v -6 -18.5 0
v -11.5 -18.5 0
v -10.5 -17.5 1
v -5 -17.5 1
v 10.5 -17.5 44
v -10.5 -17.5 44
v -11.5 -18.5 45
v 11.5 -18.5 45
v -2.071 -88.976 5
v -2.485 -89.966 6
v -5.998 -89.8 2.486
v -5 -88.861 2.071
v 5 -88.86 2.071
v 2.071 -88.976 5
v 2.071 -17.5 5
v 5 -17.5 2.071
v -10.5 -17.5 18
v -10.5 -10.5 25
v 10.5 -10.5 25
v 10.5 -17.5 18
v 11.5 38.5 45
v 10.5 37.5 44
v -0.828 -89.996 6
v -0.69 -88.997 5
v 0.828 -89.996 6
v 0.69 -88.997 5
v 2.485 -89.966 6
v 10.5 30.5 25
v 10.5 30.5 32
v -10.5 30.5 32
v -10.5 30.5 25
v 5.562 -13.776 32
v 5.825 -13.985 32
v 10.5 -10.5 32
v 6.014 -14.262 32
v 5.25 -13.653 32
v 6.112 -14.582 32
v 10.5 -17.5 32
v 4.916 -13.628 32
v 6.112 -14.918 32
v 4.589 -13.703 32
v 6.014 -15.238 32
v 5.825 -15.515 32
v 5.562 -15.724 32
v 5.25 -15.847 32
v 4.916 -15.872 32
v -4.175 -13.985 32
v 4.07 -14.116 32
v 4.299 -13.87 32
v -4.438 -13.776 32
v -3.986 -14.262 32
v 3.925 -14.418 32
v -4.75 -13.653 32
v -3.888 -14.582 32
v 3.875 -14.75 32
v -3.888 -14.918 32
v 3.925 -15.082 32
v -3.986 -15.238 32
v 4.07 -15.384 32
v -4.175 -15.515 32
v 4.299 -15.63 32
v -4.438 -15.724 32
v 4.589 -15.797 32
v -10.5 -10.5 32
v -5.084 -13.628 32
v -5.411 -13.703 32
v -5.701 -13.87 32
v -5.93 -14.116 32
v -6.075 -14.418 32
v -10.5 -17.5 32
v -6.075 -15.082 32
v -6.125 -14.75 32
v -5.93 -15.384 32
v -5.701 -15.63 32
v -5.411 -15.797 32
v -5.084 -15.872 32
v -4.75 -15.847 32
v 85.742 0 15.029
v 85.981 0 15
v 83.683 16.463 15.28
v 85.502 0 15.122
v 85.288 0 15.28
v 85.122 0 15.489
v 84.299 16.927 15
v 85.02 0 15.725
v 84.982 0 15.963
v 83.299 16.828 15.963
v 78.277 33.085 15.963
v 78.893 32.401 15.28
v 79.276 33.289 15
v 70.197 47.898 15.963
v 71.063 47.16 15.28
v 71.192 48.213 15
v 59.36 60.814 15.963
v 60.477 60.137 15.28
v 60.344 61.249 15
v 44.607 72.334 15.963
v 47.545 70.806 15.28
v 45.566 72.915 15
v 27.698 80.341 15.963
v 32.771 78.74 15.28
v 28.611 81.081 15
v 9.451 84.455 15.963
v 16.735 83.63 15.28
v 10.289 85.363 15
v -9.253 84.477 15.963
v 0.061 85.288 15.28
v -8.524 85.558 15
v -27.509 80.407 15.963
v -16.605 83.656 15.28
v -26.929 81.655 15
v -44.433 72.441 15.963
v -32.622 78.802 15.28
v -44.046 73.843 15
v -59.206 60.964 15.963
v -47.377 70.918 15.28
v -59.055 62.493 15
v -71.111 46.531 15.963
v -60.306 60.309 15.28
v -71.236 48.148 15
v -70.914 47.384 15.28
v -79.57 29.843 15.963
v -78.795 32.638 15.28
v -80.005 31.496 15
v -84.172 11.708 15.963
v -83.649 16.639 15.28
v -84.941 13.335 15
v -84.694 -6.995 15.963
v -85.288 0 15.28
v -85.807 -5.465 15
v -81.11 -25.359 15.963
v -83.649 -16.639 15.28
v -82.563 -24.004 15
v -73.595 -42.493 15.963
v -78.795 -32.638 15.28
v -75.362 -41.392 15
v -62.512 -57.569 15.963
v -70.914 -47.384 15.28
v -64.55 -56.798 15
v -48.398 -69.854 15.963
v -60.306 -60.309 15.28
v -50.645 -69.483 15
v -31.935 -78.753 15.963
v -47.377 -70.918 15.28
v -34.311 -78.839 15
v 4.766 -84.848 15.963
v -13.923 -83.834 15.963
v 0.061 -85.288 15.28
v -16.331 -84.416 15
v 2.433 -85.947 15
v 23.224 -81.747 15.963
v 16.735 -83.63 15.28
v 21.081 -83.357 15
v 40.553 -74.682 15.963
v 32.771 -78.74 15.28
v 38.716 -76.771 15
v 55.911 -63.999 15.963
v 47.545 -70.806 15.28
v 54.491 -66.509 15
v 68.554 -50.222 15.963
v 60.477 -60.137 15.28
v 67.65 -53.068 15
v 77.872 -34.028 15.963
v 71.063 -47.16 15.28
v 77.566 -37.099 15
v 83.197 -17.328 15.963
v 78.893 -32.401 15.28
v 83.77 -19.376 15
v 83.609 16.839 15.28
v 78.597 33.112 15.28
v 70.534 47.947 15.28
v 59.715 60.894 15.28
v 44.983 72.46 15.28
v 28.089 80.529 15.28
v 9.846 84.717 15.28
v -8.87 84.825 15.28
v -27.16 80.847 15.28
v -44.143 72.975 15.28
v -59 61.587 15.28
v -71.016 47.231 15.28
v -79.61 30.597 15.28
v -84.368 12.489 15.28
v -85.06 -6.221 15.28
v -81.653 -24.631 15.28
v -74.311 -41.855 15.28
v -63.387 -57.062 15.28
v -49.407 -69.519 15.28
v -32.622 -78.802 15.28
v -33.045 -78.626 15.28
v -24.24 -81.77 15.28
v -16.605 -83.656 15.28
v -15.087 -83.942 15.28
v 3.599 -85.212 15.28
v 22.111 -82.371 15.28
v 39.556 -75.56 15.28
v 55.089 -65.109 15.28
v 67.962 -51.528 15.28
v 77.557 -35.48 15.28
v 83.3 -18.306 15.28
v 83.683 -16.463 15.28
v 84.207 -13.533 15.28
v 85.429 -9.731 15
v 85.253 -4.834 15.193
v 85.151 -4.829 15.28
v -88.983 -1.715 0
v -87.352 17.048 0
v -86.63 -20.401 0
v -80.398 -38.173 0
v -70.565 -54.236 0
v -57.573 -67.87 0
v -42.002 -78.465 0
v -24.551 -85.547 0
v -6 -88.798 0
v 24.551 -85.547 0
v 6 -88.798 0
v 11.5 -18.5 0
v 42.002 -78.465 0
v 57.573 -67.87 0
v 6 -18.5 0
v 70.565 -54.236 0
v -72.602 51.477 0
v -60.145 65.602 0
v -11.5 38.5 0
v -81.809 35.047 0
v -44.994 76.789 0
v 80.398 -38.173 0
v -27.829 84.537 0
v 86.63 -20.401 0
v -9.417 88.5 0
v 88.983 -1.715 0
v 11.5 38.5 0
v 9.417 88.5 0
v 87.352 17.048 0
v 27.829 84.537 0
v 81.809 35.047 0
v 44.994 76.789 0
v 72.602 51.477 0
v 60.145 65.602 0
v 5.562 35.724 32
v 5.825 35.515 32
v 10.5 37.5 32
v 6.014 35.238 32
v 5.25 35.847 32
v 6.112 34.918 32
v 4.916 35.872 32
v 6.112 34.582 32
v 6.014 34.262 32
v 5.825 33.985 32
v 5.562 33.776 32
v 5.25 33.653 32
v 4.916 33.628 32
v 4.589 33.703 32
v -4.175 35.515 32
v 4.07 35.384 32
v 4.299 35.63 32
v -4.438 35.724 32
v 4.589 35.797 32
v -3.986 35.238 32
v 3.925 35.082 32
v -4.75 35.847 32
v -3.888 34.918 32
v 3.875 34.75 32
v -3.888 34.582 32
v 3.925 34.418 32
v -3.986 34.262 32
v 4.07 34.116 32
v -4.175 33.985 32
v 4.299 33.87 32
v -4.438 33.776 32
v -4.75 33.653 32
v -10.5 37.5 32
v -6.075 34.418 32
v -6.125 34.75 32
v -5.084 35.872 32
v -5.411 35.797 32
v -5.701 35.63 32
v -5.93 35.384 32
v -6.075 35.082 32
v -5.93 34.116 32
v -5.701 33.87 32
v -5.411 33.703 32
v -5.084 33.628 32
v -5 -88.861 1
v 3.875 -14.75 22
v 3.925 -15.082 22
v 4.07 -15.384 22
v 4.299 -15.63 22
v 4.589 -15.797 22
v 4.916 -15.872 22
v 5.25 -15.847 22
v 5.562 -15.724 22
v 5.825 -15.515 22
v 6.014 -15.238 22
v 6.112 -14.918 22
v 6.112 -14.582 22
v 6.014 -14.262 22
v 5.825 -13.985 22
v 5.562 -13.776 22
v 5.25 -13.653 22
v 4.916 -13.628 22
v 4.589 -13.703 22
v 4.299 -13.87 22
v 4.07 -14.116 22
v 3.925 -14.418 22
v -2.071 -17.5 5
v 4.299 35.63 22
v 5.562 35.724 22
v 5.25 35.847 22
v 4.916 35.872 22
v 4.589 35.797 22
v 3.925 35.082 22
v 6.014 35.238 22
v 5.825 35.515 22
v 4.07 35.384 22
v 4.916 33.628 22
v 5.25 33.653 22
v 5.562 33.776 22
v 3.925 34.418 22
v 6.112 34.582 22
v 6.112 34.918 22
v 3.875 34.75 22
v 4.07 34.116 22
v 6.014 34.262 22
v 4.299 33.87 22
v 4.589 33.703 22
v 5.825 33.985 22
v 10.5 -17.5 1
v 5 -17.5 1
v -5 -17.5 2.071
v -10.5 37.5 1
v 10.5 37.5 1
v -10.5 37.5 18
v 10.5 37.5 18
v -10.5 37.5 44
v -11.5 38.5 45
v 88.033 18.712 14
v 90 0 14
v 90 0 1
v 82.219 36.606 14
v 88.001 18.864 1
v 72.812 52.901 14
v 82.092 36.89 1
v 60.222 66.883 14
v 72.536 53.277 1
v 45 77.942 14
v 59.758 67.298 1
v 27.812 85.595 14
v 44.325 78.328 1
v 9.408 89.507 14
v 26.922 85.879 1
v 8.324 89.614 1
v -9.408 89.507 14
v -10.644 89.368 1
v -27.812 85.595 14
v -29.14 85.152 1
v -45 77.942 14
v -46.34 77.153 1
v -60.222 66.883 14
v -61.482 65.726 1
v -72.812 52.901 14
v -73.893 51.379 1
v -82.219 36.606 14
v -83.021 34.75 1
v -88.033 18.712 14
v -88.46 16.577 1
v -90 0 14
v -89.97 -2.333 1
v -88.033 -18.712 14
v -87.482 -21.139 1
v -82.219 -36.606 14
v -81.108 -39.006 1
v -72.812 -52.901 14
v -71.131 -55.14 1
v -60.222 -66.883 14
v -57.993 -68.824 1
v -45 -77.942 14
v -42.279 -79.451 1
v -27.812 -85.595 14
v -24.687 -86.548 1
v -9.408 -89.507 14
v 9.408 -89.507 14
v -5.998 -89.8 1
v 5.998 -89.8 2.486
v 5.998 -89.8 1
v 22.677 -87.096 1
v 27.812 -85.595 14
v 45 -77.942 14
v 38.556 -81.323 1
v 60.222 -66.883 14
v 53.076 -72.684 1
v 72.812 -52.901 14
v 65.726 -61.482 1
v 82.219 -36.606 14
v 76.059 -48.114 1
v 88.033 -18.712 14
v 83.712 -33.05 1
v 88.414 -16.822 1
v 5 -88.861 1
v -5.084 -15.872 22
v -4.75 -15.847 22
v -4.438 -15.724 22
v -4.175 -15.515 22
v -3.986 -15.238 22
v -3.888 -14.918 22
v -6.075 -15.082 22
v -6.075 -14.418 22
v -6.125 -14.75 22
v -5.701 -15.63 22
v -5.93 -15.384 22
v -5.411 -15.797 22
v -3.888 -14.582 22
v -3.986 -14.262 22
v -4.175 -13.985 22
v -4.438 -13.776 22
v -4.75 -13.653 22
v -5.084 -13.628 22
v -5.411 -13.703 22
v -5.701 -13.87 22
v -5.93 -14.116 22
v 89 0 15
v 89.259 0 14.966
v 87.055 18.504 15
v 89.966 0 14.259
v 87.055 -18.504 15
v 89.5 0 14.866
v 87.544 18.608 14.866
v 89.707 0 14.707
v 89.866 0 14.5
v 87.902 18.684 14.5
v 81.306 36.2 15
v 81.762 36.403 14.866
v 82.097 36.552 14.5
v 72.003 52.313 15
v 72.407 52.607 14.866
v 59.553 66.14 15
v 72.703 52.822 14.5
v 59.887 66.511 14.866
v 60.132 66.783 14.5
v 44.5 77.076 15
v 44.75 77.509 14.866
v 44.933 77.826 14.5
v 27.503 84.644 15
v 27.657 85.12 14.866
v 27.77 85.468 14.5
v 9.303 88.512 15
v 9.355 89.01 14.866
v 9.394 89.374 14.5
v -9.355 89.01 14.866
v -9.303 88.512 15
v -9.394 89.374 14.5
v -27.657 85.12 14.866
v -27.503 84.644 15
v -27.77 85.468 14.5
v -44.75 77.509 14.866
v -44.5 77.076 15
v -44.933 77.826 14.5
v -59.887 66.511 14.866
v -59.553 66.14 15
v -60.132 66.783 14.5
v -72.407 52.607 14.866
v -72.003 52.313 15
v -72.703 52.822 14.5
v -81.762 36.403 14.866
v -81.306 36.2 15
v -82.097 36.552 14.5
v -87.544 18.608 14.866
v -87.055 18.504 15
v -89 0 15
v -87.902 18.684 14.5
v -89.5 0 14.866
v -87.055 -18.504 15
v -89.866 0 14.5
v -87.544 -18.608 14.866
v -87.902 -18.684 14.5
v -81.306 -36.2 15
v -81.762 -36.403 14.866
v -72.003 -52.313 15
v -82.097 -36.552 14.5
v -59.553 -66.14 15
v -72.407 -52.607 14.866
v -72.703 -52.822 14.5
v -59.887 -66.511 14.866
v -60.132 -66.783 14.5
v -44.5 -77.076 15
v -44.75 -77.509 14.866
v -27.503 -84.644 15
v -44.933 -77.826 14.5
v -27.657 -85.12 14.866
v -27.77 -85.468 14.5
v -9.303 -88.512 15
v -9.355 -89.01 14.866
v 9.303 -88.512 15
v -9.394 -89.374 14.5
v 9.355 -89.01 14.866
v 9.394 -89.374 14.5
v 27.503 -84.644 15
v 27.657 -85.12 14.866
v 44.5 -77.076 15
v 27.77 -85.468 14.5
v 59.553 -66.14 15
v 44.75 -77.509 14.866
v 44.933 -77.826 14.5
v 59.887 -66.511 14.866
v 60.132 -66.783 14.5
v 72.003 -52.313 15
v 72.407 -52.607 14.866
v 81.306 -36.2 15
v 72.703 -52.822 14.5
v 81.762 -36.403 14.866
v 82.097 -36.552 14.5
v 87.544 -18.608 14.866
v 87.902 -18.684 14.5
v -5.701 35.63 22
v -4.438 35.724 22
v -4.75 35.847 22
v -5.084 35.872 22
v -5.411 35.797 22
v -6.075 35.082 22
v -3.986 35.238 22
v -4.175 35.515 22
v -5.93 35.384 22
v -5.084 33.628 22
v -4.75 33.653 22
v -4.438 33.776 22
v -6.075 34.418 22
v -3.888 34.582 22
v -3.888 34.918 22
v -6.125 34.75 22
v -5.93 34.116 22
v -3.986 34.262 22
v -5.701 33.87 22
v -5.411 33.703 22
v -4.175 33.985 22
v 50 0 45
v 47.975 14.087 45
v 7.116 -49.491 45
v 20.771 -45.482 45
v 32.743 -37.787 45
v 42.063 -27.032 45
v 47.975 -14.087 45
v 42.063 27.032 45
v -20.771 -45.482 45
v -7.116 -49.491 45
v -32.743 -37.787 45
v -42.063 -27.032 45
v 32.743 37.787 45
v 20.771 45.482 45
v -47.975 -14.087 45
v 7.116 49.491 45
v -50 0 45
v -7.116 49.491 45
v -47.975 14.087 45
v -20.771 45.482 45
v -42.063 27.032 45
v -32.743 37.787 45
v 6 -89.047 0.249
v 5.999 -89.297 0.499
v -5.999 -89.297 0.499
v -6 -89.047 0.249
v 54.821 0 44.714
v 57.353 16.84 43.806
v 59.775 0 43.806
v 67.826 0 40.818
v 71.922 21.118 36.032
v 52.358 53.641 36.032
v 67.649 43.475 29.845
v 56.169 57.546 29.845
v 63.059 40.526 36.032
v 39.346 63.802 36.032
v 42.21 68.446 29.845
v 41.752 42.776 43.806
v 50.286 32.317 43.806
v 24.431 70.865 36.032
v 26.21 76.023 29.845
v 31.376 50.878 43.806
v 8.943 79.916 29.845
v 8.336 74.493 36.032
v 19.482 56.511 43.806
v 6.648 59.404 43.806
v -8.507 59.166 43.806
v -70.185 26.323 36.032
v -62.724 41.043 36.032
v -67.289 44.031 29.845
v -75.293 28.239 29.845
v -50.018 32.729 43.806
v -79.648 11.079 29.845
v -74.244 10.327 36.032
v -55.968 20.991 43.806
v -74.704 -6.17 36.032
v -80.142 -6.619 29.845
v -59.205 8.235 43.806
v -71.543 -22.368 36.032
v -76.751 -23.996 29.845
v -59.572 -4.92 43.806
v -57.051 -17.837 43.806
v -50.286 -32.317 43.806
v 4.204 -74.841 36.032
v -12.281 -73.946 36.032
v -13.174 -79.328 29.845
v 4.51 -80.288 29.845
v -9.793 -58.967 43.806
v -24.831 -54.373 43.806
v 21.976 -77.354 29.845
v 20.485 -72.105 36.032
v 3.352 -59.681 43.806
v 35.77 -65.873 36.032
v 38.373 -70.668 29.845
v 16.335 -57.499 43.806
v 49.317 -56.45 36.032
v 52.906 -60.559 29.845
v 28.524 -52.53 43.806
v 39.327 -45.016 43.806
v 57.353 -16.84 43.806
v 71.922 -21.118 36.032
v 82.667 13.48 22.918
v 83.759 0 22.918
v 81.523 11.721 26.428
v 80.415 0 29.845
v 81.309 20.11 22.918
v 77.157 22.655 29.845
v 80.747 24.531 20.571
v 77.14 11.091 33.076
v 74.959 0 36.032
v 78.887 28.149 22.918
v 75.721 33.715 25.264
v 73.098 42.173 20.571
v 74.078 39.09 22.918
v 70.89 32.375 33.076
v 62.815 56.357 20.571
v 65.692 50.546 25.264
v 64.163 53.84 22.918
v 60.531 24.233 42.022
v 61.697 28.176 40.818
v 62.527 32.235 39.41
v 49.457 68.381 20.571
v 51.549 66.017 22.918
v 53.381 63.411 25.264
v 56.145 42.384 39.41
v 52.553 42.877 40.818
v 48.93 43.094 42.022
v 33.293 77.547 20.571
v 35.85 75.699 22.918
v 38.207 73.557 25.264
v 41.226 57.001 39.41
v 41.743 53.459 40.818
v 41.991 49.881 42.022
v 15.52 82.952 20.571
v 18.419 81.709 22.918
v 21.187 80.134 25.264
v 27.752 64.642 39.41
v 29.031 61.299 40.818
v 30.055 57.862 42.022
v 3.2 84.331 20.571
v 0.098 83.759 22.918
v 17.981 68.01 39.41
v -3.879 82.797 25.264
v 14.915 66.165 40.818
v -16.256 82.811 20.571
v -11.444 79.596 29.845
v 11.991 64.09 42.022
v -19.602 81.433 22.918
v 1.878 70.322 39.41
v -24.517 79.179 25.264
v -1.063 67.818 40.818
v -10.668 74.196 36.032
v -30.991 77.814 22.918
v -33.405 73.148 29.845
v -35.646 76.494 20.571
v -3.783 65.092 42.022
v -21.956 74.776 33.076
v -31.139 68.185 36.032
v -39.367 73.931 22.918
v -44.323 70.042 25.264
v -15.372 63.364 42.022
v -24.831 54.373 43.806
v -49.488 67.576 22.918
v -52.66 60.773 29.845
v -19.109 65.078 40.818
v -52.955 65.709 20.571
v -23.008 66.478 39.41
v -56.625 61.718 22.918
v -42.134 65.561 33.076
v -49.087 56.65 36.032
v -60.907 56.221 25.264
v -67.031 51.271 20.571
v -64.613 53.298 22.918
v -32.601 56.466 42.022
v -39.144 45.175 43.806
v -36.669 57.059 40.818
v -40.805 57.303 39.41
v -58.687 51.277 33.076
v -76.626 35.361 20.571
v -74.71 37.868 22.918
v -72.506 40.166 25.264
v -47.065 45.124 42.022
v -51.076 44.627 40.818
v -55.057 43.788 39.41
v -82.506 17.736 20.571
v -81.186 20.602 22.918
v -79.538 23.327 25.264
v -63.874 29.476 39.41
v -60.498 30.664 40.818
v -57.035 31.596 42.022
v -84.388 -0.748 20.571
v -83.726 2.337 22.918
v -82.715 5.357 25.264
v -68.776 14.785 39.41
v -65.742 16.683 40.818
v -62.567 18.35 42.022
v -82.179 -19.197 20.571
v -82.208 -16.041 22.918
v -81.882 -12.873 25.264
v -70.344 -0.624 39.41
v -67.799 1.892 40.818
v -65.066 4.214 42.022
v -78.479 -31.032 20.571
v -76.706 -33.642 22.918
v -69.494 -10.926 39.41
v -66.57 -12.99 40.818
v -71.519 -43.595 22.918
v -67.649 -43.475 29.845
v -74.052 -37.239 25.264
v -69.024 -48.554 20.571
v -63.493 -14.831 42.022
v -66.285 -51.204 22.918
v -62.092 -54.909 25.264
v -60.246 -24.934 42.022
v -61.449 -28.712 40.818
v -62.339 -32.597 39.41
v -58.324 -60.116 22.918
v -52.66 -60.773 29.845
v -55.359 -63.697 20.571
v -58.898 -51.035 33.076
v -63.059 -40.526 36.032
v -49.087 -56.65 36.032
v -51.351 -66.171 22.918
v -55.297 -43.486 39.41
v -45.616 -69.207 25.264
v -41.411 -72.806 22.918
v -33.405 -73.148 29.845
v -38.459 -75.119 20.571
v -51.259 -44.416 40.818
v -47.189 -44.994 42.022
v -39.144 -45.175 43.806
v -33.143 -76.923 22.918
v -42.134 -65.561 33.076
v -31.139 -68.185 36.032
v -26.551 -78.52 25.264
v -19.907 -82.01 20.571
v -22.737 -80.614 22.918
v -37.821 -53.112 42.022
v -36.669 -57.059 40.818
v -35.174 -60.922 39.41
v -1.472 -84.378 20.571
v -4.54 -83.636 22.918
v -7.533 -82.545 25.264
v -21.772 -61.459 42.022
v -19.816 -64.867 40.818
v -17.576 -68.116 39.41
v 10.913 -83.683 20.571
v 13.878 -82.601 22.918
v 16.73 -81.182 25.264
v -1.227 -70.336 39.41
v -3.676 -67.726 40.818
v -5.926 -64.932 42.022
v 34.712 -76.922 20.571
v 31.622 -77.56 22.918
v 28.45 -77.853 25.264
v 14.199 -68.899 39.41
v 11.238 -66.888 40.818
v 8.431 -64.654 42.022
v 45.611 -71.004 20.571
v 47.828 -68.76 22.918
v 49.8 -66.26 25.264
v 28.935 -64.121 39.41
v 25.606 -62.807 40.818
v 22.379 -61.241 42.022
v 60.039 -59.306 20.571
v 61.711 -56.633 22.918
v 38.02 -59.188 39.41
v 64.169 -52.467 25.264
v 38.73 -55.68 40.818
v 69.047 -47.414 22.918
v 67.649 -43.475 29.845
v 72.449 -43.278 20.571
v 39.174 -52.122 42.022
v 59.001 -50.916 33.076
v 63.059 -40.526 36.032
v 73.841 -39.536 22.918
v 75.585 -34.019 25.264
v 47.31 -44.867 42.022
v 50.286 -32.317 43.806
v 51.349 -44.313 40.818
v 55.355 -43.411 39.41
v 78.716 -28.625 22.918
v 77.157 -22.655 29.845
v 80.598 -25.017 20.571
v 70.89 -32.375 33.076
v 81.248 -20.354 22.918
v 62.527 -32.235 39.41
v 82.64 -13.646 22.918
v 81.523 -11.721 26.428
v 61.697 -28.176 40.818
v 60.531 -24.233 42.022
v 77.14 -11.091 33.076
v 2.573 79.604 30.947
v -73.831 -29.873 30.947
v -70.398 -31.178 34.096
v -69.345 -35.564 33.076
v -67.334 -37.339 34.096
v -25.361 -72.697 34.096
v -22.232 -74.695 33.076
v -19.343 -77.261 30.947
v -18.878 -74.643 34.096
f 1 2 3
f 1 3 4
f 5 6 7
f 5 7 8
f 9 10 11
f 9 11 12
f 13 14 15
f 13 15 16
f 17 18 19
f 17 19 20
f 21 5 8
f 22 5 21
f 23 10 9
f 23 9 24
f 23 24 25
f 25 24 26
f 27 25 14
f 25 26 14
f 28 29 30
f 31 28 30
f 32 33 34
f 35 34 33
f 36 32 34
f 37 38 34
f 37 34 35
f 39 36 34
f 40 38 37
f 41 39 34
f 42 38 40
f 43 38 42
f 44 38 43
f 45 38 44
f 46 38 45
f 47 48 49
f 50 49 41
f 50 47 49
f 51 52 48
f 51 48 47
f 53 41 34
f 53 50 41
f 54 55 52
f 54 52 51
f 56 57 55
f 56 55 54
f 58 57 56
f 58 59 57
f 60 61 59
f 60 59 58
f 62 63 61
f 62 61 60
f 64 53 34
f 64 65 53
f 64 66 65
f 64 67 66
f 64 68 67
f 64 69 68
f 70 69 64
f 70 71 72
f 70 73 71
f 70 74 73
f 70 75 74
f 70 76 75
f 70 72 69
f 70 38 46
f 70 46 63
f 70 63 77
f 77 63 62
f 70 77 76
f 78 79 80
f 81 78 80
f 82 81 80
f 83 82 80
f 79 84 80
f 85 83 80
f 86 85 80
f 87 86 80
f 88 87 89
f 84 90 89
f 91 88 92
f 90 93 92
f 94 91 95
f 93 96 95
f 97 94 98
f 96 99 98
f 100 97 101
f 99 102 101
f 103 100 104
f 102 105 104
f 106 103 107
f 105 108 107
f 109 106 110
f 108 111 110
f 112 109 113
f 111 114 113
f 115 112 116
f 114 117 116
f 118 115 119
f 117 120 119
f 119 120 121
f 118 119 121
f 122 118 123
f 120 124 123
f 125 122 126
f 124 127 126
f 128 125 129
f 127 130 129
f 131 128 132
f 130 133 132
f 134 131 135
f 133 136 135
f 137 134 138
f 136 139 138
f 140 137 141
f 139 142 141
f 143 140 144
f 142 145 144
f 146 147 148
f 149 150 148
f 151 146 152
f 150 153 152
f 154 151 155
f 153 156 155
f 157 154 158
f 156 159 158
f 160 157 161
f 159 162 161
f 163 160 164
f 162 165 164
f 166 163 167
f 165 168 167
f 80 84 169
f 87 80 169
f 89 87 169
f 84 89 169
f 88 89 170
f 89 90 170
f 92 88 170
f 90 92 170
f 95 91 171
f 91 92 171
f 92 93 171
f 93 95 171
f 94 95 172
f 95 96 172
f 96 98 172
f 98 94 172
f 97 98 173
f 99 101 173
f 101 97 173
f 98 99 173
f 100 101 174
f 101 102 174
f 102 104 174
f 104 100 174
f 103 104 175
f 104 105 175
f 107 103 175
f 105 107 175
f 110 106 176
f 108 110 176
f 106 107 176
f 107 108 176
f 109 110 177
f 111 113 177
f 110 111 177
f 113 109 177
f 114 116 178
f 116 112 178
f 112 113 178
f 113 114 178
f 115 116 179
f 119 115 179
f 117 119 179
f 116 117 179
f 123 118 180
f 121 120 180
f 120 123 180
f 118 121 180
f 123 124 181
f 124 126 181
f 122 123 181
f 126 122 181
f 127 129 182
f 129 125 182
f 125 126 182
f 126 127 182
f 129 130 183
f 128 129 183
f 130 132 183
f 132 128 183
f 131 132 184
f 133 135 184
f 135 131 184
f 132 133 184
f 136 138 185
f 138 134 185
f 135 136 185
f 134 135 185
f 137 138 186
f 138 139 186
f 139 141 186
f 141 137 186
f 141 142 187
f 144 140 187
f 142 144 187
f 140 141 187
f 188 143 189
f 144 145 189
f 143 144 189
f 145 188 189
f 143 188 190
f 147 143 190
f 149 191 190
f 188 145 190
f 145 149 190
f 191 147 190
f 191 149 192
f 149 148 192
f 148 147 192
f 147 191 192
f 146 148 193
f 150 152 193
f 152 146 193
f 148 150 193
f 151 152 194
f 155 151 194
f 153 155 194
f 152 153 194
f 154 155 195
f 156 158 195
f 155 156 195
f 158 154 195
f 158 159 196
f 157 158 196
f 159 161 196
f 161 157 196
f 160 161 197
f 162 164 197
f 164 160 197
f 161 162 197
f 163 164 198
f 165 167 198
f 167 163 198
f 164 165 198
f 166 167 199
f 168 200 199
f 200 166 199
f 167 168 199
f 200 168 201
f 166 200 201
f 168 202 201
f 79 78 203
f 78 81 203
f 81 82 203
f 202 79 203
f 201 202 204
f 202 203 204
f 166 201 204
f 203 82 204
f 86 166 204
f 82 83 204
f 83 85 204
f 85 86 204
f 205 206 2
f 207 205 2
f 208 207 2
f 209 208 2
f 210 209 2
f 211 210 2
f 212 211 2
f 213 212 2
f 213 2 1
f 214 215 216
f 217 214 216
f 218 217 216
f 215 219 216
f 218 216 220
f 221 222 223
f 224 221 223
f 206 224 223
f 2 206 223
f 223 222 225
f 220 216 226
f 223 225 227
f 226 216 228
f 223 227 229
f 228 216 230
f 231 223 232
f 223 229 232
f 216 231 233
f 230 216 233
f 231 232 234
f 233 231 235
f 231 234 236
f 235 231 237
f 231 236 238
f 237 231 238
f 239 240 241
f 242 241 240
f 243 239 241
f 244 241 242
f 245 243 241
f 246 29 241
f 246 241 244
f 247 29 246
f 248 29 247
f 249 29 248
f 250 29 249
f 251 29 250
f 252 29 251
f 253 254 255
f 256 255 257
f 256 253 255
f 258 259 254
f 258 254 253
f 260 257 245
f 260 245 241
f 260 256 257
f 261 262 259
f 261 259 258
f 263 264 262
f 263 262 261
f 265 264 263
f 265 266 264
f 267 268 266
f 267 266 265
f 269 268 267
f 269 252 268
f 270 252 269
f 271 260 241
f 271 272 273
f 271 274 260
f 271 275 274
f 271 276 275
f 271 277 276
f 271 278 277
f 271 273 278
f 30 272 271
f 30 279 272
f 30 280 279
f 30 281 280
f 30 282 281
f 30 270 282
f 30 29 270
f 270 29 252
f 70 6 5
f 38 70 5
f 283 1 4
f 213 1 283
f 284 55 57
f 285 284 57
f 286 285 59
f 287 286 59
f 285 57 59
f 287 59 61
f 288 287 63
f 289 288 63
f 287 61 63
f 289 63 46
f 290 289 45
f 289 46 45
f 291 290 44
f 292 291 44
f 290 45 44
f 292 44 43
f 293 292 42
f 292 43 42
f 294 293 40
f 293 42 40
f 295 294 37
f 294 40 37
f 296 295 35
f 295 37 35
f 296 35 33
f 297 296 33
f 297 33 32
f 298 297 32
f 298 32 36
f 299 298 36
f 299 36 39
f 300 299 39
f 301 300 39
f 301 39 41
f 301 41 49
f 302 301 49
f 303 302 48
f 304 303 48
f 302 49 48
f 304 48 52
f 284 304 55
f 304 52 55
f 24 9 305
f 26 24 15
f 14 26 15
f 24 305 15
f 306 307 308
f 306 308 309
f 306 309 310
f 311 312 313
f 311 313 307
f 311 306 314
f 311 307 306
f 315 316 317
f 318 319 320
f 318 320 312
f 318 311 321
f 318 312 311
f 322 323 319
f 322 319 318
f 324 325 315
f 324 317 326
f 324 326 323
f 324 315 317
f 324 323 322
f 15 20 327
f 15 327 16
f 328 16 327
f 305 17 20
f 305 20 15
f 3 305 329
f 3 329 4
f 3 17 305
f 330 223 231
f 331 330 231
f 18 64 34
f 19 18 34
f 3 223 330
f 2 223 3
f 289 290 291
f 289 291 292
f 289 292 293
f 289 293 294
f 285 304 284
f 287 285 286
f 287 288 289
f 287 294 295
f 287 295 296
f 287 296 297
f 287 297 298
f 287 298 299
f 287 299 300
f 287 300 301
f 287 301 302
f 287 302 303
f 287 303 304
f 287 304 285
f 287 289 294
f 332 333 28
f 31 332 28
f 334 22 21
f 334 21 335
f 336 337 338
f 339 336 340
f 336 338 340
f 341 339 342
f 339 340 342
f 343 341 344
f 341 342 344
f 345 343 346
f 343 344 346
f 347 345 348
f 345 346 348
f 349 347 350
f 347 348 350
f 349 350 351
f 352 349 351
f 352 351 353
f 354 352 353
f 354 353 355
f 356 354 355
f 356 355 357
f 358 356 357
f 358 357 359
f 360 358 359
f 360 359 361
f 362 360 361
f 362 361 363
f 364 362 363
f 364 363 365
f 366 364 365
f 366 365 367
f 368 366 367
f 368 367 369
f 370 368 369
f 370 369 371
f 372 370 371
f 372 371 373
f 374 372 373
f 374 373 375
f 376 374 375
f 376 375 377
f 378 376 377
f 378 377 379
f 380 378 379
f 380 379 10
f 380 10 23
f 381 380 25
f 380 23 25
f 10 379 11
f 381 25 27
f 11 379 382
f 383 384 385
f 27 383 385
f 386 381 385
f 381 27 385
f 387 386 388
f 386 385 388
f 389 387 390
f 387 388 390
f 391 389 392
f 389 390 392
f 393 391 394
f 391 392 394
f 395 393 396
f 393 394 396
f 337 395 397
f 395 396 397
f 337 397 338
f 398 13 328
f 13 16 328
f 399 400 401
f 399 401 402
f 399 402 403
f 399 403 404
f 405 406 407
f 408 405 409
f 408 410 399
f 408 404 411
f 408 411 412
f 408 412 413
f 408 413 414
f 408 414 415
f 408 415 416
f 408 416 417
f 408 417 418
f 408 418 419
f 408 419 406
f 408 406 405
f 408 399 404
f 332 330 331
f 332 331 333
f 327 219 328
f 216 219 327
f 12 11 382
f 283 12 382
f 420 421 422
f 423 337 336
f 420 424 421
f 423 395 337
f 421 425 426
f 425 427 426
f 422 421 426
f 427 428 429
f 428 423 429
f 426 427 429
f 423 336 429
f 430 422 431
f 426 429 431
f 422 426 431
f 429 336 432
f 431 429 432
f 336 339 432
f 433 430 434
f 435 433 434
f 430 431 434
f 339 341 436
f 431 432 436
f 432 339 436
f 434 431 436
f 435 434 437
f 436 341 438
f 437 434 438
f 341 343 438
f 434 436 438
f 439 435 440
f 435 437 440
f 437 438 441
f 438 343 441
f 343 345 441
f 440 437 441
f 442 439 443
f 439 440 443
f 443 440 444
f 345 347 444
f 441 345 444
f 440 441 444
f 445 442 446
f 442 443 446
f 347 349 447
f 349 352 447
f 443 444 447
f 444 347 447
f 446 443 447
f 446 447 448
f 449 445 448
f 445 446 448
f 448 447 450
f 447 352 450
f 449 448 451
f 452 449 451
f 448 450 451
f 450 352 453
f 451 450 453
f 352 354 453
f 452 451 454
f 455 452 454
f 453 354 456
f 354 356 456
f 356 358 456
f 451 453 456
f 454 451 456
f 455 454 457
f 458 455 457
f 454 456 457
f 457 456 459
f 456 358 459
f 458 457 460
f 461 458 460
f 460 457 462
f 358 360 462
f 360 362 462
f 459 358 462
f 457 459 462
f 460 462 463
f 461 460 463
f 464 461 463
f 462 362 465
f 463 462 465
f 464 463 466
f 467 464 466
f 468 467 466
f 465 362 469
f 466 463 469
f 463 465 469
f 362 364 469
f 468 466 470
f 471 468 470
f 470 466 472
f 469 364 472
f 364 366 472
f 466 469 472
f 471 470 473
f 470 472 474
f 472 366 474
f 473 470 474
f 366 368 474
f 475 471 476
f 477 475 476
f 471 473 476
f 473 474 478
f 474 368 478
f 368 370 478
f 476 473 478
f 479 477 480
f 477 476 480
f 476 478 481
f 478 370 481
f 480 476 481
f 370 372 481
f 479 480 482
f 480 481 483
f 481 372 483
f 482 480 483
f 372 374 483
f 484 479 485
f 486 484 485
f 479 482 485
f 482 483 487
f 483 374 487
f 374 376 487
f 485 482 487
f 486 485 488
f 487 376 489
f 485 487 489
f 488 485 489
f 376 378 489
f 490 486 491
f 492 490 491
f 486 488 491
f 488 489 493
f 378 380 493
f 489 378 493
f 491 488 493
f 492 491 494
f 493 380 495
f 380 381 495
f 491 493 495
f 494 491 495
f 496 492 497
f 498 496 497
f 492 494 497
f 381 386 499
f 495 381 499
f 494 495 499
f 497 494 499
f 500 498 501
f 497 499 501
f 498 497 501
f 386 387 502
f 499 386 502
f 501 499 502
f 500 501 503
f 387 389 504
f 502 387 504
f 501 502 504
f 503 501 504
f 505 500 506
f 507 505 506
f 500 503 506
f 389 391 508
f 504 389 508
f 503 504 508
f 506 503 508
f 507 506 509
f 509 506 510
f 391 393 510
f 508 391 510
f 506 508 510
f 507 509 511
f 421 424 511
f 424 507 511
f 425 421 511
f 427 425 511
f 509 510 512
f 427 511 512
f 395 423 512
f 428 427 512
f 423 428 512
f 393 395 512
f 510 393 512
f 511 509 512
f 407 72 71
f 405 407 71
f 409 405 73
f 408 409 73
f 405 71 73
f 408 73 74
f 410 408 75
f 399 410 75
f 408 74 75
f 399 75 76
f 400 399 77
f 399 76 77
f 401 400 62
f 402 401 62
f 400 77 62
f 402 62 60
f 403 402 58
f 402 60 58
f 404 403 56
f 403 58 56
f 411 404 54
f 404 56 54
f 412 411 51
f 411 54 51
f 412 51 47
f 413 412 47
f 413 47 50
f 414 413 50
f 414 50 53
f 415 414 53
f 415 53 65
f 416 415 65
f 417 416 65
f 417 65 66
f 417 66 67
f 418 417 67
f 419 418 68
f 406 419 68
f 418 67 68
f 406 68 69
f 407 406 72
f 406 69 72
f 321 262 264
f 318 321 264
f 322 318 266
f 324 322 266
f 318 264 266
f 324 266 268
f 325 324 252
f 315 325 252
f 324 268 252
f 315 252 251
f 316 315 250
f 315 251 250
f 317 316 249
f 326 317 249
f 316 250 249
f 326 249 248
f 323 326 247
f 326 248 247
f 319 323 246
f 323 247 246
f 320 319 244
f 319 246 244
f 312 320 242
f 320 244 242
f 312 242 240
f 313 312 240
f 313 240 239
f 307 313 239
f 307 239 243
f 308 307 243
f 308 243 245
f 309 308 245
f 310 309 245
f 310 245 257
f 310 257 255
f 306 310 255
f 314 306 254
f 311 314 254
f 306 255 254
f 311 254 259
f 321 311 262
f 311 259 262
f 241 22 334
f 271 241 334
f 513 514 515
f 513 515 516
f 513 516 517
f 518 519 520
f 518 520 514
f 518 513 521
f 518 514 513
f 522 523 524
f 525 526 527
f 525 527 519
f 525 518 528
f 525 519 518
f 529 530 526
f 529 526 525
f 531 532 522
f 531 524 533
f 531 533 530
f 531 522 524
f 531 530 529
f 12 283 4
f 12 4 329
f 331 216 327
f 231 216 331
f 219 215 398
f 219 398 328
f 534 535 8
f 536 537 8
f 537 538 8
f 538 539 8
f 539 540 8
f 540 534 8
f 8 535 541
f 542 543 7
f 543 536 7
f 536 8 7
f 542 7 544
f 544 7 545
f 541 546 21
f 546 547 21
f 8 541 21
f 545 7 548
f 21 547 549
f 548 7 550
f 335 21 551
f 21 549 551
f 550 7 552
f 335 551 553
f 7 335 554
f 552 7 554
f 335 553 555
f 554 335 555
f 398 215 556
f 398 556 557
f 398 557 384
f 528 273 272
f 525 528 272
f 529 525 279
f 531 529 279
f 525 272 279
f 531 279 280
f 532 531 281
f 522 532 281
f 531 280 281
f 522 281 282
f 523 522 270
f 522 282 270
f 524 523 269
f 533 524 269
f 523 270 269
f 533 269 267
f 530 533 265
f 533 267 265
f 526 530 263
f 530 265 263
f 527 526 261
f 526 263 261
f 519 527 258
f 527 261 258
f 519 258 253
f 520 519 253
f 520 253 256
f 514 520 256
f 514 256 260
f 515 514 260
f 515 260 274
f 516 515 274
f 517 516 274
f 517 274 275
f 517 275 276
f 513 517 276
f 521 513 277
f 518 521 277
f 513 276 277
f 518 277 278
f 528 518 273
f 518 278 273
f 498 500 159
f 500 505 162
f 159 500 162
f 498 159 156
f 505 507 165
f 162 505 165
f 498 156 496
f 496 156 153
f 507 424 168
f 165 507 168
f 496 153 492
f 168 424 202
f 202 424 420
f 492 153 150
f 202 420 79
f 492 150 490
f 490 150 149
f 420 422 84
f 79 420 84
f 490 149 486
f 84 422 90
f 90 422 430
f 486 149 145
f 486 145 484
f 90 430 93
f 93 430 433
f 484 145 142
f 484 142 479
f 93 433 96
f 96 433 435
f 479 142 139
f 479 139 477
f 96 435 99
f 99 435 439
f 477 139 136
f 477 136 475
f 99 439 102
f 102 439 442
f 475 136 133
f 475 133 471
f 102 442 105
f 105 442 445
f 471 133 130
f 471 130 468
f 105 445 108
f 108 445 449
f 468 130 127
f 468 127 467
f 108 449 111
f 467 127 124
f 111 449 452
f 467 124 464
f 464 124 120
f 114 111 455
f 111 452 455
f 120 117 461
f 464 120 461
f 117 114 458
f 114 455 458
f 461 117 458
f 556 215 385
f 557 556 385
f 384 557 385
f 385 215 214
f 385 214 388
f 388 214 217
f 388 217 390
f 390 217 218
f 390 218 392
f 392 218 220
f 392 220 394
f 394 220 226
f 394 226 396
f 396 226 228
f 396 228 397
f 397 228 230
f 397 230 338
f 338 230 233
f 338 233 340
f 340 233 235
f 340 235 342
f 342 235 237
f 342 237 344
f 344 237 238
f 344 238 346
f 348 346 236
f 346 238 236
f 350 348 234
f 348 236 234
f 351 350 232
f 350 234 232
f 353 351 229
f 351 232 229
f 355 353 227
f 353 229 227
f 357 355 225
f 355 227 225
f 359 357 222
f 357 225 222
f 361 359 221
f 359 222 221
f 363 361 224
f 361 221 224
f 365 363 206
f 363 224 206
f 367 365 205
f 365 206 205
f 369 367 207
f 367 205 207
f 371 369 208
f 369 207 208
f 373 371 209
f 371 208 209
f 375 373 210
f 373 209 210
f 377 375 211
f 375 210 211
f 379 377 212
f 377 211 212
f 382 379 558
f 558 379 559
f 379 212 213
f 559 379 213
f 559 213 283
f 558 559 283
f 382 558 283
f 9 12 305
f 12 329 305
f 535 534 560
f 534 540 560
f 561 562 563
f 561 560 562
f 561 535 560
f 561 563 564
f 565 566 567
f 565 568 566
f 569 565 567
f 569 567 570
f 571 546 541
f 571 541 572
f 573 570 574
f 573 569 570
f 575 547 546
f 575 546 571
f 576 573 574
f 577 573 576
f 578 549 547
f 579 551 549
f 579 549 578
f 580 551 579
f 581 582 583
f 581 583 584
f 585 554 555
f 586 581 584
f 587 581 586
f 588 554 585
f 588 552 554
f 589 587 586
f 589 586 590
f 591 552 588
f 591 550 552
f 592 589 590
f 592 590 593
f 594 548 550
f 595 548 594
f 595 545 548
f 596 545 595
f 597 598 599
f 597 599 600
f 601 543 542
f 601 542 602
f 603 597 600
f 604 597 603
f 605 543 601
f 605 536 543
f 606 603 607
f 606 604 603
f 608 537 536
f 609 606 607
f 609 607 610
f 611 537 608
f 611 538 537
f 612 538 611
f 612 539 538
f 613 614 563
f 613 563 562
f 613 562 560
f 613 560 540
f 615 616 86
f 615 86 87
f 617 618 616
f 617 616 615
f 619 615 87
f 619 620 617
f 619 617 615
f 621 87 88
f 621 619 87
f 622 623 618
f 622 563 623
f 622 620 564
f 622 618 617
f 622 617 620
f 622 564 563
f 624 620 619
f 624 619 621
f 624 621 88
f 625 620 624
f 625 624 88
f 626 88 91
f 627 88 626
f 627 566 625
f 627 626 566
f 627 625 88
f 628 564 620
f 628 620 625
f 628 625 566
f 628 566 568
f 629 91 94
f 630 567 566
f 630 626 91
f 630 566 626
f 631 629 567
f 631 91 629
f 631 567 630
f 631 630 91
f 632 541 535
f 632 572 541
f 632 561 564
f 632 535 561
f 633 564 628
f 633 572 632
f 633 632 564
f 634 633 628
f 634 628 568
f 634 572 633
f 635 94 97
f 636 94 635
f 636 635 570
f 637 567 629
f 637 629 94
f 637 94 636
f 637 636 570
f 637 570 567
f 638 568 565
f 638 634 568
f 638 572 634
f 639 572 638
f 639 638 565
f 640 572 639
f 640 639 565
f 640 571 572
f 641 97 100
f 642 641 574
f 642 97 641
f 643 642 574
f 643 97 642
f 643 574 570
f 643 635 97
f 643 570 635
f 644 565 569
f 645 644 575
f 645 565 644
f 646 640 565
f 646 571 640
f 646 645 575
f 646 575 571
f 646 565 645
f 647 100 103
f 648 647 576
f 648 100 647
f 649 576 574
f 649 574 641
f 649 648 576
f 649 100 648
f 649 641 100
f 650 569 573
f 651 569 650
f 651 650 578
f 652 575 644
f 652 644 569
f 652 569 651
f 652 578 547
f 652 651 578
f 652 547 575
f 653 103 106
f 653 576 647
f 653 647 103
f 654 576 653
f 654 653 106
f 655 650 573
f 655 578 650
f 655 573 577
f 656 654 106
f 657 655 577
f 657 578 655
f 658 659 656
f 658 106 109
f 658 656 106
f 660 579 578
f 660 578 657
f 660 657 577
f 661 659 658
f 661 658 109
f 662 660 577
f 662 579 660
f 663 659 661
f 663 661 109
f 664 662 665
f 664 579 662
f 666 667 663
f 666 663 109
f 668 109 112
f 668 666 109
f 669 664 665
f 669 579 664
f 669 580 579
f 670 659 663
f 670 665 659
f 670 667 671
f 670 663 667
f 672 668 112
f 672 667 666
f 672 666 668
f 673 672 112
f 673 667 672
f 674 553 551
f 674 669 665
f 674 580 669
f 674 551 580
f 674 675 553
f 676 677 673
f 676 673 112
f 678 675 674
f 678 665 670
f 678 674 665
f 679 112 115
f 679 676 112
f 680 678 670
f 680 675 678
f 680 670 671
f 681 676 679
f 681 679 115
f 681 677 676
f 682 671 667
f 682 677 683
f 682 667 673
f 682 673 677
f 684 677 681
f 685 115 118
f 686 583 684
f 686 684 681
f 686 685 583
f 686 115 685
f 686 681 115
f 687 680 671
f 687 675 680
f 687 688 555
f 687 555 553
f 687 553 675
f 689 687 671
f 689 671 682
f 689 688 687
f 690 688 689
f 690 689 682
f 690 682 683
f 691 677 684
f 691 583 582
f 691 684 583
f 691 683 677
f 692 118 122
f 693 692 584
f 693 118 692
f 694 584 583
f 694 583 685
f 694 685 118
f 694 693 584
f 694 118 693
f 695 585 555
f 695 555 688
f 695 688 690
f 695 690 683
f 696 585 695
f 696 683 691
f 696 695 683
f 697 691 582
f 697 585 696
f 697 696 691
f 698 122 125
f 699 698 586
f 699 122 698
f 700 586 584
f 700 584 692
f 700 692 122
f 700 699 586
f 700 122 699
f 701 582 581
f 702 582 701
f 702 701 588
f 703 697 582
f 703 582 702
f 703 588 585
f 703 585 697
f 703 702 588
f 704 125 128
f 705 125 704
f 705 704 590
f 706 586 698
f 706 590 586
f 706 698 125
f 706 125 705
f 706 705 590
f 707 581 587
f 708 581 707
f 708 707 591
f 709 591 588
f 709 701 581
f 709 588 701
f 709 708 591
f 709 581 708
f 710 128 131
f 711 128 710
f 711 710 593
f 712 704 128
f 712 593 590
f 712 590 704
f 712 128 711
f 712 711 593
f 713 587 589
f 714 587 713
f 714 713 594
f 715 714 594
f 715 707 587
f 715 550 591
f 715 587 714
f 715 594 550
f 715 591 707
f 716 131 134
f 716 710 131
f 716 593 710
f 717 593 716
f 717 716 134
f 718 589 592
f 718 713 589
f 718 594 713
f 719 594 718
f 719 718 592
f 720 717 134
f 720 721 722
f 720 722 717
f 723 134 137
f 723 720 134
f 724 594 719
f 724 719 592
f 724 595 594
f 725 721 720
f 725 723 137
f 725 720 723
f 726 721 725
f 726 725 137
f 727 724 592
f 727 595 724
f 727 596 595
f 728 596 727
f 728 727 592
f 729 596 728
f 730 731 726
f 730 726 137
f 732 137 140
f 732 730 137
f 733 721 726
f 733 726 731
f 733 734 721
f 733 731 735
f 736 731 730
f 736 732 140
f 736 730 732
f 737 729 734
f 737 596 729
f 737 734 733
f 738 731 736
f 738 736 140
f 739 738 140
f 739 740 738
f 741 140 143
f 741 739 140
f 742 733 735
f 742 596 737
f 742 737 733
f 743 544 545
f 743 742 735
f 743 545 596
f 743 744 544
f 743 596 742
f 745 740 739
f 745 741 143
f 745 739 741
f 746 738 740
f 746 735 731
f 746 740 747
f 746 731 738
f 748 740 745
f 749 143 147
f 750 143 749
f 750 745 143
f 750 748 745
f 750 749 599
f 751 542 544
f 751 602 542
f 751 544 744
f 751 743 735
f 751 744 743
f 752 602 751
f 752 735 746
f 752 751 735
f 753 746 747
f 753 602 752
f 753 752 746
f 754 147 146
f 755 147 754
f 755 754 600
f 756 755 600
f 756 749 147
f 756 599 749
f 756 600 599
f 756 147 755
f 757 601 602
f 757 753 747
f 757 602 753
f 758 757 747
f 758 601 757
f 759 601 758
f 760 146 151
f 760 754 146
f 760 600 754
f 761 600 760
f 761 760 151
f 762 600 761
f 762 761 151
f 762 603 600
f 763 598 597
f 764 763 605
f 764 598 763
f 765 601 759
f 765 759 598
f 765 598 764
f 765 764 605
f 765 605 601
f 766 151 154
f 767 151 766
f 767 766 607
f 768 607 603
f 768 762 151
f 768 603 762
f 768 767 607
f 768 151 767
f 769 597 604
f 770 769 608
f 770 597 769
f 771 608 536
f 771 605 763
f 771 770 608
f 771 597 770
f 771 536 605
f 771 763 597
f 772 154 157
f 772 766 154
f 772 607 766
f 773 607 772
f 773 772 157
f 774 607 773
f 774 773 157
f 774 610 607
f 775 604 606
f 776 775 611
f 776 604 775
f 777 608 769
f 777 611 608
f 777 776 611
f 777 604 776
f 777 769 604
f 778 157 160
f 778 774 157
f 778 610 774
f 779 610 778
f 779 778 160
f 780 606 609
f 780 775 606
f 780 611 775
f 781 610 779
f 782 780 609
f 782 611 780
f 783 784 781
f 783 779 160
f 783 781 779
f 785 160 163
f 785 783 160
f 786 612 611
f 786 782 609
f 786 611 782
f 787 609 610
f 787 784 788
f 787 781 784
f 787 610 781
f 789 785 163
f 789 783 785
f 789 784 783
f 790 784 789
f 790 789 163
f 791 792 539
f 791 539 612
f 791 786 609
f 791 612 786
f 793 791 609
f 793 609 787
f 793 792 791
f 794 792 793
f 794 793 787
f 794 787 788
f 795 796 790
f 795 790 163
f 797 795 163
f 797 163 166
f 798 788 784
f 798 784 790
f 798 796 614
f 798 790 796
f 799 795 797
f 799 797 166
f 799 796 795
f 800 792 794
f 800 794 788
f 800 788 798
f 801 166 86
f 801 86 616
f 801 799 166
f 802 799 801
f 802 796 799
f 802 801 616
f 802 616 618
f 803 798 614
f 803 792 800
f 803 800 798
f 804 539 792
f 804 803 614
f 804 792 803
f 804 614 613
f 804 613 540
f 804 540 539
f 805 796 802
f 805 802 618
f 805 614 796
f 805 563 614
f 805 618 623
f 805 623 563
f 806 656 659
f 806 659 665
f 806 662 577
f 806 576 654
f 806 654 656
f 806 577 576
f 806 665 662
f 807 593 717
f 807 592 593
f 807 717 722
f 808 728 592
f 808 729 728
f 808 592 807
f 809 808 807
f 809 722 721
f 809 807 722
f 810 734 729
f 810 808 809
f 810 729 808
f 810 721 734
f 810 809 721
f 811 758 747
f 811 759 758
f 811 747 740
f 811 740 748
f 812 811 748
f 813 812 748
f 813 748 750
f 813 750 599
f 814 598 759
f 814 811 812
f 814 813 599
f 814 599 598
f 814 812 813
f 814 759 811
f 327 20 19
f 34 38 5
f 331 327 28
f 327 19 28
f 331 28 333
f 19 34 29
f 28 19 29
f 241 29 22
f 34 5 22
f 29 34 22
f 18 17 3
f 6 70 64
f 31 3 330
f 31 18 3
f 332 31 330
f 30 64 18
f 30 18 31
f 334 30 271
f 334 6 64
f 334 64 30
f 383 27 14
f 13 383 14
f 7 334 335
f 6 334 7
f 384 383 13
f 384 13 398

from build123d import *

# Parameters (mm, degrees)
FILLET_R        = 1
POCKET_DEPTH    = 13
POCKET012_DEPTH = 32
SKETCH026_R     = 1.125
POCKET013_DEPTH = 10
POCKET014_DEPTH = 10.5
CHAMFER004_SIZE = 1
POCKET015_DEPTH = 72.5
CHAMFER_SIZE    = 1


with BuildPart() as part:
    # Sketch → Revolution (revolve)
    with BuildSketch(Plane.XZ):
        with BuildLine():
            Line((85, 15), (90, 15))
            Line((90, 15), (90, 0))
            Line((90, 0), (0, 0))
            Line((0, 0), (0, 45))
            Line((0, 45), (50, 45))
            add(Edge.make_bspline(
                [(85, 15), (85, 45), (50, 45)],
                knots=[0, 0, 0, 1.570796, 1.570796, 1.570796], degree=2, weights=[1, 0.707107, 1]))
        make_face()
    revolve(axis=Axis((0, 0, 0), (0, 0, 1)))

    # Fillet
    fillet_edges = [part.edges().sort_by_distance(p)[0] for p in [
        (-90, 0, 15),
        (-85, 0, 15),
    ]]
    fillet(fillet_edges, radius=FILLET_R)

    # Sketch020 → Pocket (cut)
    with BuildSketch(Plane(origin=(0, 0, 45), x_dir=(-1, 0, 0), z_dir=(0, 0, 1))):
        Polygon((-10.5, -37.5), (10.5, -37.5), (10.5, 17.5), (0, 17.5), (-10.5, 17.5), align=None)
    extrude(amount=-POCKET_DEPTH, mode=Mode.SUBTRACT)

    # Sketch025 (on Face13 of Pocket) → Pocket012 (cut)
    with BuildSketch(Plane(origin=(0, 0, 32), x_dir=(-1, 0, 0), z_dir=(0, 0, 1))):
        Polygon((-10.5, -30.5), (10.5, -30.5), (10.5, 10.5), (0, 10.5), (-10.5, 10.5), align=None)
    extrude(amount=-POCKET012_DEPTH, mode=Mode.SUBTRACT)

    # Sketch026 (on Face19 of Pocket012) → Pocket013 (cut)
    with BuildSketch(Plane(origin=(0, 0, 32), x_dir=(-1, 0, 0), z_dir=(0, 0, 1))):
        with Locations((5, 14.75)):
            Circle(SKETCH026_R)
        with Locations((-5, 14.75)):
            Circle(SKETCH026_R)
        with Locations((5, -34.75)):
            Circle(SKETCH026_R)
        with Locations((-5, -34.75)):
            Circle(SKETCH026_R)
    extrude(amount=-POCKET013_DEPTH, mode=Mode.SUBTRACT)

    # Sketch027 → Pocket014 (cut, symmetric)
    with BuildSketch(Plane.YZ):
        Polygon((-10.5, 25), (-17.5, 17.999993), (-17.5, 0), (-10.5, 0), align=None)
        Polygon((30.5, 0), (37.5, 0), (37.5, 18.000002), (30.5, 25), align=None)
    extrude(amount=POCKET014_DEPTH, both=True, mode=Mode.SUBTRACT)

    # Chamfer004
    chamfer004_edges = [part.edges().sort_by_distance(p)[0] for p in [
        (-10.5, 10, 45),
        (0, 37.5, 45),
        (10.5, 10, 45),
        (5.25, -17.5, 45),
        (-5.25, -17.5, 45),
    ]]
    chamfer(chamfer004_edges, length=CHAMFER004_SIZE)

    # Sketch028 (on Face36 of Chamfer004) → Pocket015 (cut)
    with BuildSketch(Plane(origin=(0, -17.5, 0), x_dir=(1, 0, 0), z_dir=(0, 1, 0))):
        Polygon((5, 2.071068), (2.071068, 5), (-2.071068, 5), (-5, 2.071068), (-5, -2.071068), (-2.071068, -5), (2.071068, -5), (5, -2.071068), align=None)
    extrude(amount=-POCKET015_DEPTH, mode=Mode.SUBTRACT)

    # Chamfer
    chamfer_edges = [part.edges().sort_by_distance(p)[0] for p in [
        (65.383484, -61.846584, 0),
        (5, -53.680502, 0),
        (7.75, -17.5, 0),
        (10.5, -14, 0),
        (10.5, 10, 0),
        (10.5, 34, 0),
        (0, 37.5, 0),
        (-10.5, 34, 0),
        (-10.5, 10, 0),
        (-10.5, -14, 0),
        (-7.75, -17.5, 0),
        (-5, -53.680502, 0),
        (-61.846584, 65.383484, 0),
        (-5, -89.861004, 1.035534),
        (-3.535769, -89.93052, 3.535299),
        (0, -90, 5),
        (3.535769, -89.93052, 3.535299),
        (5, -89.861004, 1.035534),
    ]]
    chamfer(chamfer_edges, length=CHAMFER_SIZE)


solid = part.part
